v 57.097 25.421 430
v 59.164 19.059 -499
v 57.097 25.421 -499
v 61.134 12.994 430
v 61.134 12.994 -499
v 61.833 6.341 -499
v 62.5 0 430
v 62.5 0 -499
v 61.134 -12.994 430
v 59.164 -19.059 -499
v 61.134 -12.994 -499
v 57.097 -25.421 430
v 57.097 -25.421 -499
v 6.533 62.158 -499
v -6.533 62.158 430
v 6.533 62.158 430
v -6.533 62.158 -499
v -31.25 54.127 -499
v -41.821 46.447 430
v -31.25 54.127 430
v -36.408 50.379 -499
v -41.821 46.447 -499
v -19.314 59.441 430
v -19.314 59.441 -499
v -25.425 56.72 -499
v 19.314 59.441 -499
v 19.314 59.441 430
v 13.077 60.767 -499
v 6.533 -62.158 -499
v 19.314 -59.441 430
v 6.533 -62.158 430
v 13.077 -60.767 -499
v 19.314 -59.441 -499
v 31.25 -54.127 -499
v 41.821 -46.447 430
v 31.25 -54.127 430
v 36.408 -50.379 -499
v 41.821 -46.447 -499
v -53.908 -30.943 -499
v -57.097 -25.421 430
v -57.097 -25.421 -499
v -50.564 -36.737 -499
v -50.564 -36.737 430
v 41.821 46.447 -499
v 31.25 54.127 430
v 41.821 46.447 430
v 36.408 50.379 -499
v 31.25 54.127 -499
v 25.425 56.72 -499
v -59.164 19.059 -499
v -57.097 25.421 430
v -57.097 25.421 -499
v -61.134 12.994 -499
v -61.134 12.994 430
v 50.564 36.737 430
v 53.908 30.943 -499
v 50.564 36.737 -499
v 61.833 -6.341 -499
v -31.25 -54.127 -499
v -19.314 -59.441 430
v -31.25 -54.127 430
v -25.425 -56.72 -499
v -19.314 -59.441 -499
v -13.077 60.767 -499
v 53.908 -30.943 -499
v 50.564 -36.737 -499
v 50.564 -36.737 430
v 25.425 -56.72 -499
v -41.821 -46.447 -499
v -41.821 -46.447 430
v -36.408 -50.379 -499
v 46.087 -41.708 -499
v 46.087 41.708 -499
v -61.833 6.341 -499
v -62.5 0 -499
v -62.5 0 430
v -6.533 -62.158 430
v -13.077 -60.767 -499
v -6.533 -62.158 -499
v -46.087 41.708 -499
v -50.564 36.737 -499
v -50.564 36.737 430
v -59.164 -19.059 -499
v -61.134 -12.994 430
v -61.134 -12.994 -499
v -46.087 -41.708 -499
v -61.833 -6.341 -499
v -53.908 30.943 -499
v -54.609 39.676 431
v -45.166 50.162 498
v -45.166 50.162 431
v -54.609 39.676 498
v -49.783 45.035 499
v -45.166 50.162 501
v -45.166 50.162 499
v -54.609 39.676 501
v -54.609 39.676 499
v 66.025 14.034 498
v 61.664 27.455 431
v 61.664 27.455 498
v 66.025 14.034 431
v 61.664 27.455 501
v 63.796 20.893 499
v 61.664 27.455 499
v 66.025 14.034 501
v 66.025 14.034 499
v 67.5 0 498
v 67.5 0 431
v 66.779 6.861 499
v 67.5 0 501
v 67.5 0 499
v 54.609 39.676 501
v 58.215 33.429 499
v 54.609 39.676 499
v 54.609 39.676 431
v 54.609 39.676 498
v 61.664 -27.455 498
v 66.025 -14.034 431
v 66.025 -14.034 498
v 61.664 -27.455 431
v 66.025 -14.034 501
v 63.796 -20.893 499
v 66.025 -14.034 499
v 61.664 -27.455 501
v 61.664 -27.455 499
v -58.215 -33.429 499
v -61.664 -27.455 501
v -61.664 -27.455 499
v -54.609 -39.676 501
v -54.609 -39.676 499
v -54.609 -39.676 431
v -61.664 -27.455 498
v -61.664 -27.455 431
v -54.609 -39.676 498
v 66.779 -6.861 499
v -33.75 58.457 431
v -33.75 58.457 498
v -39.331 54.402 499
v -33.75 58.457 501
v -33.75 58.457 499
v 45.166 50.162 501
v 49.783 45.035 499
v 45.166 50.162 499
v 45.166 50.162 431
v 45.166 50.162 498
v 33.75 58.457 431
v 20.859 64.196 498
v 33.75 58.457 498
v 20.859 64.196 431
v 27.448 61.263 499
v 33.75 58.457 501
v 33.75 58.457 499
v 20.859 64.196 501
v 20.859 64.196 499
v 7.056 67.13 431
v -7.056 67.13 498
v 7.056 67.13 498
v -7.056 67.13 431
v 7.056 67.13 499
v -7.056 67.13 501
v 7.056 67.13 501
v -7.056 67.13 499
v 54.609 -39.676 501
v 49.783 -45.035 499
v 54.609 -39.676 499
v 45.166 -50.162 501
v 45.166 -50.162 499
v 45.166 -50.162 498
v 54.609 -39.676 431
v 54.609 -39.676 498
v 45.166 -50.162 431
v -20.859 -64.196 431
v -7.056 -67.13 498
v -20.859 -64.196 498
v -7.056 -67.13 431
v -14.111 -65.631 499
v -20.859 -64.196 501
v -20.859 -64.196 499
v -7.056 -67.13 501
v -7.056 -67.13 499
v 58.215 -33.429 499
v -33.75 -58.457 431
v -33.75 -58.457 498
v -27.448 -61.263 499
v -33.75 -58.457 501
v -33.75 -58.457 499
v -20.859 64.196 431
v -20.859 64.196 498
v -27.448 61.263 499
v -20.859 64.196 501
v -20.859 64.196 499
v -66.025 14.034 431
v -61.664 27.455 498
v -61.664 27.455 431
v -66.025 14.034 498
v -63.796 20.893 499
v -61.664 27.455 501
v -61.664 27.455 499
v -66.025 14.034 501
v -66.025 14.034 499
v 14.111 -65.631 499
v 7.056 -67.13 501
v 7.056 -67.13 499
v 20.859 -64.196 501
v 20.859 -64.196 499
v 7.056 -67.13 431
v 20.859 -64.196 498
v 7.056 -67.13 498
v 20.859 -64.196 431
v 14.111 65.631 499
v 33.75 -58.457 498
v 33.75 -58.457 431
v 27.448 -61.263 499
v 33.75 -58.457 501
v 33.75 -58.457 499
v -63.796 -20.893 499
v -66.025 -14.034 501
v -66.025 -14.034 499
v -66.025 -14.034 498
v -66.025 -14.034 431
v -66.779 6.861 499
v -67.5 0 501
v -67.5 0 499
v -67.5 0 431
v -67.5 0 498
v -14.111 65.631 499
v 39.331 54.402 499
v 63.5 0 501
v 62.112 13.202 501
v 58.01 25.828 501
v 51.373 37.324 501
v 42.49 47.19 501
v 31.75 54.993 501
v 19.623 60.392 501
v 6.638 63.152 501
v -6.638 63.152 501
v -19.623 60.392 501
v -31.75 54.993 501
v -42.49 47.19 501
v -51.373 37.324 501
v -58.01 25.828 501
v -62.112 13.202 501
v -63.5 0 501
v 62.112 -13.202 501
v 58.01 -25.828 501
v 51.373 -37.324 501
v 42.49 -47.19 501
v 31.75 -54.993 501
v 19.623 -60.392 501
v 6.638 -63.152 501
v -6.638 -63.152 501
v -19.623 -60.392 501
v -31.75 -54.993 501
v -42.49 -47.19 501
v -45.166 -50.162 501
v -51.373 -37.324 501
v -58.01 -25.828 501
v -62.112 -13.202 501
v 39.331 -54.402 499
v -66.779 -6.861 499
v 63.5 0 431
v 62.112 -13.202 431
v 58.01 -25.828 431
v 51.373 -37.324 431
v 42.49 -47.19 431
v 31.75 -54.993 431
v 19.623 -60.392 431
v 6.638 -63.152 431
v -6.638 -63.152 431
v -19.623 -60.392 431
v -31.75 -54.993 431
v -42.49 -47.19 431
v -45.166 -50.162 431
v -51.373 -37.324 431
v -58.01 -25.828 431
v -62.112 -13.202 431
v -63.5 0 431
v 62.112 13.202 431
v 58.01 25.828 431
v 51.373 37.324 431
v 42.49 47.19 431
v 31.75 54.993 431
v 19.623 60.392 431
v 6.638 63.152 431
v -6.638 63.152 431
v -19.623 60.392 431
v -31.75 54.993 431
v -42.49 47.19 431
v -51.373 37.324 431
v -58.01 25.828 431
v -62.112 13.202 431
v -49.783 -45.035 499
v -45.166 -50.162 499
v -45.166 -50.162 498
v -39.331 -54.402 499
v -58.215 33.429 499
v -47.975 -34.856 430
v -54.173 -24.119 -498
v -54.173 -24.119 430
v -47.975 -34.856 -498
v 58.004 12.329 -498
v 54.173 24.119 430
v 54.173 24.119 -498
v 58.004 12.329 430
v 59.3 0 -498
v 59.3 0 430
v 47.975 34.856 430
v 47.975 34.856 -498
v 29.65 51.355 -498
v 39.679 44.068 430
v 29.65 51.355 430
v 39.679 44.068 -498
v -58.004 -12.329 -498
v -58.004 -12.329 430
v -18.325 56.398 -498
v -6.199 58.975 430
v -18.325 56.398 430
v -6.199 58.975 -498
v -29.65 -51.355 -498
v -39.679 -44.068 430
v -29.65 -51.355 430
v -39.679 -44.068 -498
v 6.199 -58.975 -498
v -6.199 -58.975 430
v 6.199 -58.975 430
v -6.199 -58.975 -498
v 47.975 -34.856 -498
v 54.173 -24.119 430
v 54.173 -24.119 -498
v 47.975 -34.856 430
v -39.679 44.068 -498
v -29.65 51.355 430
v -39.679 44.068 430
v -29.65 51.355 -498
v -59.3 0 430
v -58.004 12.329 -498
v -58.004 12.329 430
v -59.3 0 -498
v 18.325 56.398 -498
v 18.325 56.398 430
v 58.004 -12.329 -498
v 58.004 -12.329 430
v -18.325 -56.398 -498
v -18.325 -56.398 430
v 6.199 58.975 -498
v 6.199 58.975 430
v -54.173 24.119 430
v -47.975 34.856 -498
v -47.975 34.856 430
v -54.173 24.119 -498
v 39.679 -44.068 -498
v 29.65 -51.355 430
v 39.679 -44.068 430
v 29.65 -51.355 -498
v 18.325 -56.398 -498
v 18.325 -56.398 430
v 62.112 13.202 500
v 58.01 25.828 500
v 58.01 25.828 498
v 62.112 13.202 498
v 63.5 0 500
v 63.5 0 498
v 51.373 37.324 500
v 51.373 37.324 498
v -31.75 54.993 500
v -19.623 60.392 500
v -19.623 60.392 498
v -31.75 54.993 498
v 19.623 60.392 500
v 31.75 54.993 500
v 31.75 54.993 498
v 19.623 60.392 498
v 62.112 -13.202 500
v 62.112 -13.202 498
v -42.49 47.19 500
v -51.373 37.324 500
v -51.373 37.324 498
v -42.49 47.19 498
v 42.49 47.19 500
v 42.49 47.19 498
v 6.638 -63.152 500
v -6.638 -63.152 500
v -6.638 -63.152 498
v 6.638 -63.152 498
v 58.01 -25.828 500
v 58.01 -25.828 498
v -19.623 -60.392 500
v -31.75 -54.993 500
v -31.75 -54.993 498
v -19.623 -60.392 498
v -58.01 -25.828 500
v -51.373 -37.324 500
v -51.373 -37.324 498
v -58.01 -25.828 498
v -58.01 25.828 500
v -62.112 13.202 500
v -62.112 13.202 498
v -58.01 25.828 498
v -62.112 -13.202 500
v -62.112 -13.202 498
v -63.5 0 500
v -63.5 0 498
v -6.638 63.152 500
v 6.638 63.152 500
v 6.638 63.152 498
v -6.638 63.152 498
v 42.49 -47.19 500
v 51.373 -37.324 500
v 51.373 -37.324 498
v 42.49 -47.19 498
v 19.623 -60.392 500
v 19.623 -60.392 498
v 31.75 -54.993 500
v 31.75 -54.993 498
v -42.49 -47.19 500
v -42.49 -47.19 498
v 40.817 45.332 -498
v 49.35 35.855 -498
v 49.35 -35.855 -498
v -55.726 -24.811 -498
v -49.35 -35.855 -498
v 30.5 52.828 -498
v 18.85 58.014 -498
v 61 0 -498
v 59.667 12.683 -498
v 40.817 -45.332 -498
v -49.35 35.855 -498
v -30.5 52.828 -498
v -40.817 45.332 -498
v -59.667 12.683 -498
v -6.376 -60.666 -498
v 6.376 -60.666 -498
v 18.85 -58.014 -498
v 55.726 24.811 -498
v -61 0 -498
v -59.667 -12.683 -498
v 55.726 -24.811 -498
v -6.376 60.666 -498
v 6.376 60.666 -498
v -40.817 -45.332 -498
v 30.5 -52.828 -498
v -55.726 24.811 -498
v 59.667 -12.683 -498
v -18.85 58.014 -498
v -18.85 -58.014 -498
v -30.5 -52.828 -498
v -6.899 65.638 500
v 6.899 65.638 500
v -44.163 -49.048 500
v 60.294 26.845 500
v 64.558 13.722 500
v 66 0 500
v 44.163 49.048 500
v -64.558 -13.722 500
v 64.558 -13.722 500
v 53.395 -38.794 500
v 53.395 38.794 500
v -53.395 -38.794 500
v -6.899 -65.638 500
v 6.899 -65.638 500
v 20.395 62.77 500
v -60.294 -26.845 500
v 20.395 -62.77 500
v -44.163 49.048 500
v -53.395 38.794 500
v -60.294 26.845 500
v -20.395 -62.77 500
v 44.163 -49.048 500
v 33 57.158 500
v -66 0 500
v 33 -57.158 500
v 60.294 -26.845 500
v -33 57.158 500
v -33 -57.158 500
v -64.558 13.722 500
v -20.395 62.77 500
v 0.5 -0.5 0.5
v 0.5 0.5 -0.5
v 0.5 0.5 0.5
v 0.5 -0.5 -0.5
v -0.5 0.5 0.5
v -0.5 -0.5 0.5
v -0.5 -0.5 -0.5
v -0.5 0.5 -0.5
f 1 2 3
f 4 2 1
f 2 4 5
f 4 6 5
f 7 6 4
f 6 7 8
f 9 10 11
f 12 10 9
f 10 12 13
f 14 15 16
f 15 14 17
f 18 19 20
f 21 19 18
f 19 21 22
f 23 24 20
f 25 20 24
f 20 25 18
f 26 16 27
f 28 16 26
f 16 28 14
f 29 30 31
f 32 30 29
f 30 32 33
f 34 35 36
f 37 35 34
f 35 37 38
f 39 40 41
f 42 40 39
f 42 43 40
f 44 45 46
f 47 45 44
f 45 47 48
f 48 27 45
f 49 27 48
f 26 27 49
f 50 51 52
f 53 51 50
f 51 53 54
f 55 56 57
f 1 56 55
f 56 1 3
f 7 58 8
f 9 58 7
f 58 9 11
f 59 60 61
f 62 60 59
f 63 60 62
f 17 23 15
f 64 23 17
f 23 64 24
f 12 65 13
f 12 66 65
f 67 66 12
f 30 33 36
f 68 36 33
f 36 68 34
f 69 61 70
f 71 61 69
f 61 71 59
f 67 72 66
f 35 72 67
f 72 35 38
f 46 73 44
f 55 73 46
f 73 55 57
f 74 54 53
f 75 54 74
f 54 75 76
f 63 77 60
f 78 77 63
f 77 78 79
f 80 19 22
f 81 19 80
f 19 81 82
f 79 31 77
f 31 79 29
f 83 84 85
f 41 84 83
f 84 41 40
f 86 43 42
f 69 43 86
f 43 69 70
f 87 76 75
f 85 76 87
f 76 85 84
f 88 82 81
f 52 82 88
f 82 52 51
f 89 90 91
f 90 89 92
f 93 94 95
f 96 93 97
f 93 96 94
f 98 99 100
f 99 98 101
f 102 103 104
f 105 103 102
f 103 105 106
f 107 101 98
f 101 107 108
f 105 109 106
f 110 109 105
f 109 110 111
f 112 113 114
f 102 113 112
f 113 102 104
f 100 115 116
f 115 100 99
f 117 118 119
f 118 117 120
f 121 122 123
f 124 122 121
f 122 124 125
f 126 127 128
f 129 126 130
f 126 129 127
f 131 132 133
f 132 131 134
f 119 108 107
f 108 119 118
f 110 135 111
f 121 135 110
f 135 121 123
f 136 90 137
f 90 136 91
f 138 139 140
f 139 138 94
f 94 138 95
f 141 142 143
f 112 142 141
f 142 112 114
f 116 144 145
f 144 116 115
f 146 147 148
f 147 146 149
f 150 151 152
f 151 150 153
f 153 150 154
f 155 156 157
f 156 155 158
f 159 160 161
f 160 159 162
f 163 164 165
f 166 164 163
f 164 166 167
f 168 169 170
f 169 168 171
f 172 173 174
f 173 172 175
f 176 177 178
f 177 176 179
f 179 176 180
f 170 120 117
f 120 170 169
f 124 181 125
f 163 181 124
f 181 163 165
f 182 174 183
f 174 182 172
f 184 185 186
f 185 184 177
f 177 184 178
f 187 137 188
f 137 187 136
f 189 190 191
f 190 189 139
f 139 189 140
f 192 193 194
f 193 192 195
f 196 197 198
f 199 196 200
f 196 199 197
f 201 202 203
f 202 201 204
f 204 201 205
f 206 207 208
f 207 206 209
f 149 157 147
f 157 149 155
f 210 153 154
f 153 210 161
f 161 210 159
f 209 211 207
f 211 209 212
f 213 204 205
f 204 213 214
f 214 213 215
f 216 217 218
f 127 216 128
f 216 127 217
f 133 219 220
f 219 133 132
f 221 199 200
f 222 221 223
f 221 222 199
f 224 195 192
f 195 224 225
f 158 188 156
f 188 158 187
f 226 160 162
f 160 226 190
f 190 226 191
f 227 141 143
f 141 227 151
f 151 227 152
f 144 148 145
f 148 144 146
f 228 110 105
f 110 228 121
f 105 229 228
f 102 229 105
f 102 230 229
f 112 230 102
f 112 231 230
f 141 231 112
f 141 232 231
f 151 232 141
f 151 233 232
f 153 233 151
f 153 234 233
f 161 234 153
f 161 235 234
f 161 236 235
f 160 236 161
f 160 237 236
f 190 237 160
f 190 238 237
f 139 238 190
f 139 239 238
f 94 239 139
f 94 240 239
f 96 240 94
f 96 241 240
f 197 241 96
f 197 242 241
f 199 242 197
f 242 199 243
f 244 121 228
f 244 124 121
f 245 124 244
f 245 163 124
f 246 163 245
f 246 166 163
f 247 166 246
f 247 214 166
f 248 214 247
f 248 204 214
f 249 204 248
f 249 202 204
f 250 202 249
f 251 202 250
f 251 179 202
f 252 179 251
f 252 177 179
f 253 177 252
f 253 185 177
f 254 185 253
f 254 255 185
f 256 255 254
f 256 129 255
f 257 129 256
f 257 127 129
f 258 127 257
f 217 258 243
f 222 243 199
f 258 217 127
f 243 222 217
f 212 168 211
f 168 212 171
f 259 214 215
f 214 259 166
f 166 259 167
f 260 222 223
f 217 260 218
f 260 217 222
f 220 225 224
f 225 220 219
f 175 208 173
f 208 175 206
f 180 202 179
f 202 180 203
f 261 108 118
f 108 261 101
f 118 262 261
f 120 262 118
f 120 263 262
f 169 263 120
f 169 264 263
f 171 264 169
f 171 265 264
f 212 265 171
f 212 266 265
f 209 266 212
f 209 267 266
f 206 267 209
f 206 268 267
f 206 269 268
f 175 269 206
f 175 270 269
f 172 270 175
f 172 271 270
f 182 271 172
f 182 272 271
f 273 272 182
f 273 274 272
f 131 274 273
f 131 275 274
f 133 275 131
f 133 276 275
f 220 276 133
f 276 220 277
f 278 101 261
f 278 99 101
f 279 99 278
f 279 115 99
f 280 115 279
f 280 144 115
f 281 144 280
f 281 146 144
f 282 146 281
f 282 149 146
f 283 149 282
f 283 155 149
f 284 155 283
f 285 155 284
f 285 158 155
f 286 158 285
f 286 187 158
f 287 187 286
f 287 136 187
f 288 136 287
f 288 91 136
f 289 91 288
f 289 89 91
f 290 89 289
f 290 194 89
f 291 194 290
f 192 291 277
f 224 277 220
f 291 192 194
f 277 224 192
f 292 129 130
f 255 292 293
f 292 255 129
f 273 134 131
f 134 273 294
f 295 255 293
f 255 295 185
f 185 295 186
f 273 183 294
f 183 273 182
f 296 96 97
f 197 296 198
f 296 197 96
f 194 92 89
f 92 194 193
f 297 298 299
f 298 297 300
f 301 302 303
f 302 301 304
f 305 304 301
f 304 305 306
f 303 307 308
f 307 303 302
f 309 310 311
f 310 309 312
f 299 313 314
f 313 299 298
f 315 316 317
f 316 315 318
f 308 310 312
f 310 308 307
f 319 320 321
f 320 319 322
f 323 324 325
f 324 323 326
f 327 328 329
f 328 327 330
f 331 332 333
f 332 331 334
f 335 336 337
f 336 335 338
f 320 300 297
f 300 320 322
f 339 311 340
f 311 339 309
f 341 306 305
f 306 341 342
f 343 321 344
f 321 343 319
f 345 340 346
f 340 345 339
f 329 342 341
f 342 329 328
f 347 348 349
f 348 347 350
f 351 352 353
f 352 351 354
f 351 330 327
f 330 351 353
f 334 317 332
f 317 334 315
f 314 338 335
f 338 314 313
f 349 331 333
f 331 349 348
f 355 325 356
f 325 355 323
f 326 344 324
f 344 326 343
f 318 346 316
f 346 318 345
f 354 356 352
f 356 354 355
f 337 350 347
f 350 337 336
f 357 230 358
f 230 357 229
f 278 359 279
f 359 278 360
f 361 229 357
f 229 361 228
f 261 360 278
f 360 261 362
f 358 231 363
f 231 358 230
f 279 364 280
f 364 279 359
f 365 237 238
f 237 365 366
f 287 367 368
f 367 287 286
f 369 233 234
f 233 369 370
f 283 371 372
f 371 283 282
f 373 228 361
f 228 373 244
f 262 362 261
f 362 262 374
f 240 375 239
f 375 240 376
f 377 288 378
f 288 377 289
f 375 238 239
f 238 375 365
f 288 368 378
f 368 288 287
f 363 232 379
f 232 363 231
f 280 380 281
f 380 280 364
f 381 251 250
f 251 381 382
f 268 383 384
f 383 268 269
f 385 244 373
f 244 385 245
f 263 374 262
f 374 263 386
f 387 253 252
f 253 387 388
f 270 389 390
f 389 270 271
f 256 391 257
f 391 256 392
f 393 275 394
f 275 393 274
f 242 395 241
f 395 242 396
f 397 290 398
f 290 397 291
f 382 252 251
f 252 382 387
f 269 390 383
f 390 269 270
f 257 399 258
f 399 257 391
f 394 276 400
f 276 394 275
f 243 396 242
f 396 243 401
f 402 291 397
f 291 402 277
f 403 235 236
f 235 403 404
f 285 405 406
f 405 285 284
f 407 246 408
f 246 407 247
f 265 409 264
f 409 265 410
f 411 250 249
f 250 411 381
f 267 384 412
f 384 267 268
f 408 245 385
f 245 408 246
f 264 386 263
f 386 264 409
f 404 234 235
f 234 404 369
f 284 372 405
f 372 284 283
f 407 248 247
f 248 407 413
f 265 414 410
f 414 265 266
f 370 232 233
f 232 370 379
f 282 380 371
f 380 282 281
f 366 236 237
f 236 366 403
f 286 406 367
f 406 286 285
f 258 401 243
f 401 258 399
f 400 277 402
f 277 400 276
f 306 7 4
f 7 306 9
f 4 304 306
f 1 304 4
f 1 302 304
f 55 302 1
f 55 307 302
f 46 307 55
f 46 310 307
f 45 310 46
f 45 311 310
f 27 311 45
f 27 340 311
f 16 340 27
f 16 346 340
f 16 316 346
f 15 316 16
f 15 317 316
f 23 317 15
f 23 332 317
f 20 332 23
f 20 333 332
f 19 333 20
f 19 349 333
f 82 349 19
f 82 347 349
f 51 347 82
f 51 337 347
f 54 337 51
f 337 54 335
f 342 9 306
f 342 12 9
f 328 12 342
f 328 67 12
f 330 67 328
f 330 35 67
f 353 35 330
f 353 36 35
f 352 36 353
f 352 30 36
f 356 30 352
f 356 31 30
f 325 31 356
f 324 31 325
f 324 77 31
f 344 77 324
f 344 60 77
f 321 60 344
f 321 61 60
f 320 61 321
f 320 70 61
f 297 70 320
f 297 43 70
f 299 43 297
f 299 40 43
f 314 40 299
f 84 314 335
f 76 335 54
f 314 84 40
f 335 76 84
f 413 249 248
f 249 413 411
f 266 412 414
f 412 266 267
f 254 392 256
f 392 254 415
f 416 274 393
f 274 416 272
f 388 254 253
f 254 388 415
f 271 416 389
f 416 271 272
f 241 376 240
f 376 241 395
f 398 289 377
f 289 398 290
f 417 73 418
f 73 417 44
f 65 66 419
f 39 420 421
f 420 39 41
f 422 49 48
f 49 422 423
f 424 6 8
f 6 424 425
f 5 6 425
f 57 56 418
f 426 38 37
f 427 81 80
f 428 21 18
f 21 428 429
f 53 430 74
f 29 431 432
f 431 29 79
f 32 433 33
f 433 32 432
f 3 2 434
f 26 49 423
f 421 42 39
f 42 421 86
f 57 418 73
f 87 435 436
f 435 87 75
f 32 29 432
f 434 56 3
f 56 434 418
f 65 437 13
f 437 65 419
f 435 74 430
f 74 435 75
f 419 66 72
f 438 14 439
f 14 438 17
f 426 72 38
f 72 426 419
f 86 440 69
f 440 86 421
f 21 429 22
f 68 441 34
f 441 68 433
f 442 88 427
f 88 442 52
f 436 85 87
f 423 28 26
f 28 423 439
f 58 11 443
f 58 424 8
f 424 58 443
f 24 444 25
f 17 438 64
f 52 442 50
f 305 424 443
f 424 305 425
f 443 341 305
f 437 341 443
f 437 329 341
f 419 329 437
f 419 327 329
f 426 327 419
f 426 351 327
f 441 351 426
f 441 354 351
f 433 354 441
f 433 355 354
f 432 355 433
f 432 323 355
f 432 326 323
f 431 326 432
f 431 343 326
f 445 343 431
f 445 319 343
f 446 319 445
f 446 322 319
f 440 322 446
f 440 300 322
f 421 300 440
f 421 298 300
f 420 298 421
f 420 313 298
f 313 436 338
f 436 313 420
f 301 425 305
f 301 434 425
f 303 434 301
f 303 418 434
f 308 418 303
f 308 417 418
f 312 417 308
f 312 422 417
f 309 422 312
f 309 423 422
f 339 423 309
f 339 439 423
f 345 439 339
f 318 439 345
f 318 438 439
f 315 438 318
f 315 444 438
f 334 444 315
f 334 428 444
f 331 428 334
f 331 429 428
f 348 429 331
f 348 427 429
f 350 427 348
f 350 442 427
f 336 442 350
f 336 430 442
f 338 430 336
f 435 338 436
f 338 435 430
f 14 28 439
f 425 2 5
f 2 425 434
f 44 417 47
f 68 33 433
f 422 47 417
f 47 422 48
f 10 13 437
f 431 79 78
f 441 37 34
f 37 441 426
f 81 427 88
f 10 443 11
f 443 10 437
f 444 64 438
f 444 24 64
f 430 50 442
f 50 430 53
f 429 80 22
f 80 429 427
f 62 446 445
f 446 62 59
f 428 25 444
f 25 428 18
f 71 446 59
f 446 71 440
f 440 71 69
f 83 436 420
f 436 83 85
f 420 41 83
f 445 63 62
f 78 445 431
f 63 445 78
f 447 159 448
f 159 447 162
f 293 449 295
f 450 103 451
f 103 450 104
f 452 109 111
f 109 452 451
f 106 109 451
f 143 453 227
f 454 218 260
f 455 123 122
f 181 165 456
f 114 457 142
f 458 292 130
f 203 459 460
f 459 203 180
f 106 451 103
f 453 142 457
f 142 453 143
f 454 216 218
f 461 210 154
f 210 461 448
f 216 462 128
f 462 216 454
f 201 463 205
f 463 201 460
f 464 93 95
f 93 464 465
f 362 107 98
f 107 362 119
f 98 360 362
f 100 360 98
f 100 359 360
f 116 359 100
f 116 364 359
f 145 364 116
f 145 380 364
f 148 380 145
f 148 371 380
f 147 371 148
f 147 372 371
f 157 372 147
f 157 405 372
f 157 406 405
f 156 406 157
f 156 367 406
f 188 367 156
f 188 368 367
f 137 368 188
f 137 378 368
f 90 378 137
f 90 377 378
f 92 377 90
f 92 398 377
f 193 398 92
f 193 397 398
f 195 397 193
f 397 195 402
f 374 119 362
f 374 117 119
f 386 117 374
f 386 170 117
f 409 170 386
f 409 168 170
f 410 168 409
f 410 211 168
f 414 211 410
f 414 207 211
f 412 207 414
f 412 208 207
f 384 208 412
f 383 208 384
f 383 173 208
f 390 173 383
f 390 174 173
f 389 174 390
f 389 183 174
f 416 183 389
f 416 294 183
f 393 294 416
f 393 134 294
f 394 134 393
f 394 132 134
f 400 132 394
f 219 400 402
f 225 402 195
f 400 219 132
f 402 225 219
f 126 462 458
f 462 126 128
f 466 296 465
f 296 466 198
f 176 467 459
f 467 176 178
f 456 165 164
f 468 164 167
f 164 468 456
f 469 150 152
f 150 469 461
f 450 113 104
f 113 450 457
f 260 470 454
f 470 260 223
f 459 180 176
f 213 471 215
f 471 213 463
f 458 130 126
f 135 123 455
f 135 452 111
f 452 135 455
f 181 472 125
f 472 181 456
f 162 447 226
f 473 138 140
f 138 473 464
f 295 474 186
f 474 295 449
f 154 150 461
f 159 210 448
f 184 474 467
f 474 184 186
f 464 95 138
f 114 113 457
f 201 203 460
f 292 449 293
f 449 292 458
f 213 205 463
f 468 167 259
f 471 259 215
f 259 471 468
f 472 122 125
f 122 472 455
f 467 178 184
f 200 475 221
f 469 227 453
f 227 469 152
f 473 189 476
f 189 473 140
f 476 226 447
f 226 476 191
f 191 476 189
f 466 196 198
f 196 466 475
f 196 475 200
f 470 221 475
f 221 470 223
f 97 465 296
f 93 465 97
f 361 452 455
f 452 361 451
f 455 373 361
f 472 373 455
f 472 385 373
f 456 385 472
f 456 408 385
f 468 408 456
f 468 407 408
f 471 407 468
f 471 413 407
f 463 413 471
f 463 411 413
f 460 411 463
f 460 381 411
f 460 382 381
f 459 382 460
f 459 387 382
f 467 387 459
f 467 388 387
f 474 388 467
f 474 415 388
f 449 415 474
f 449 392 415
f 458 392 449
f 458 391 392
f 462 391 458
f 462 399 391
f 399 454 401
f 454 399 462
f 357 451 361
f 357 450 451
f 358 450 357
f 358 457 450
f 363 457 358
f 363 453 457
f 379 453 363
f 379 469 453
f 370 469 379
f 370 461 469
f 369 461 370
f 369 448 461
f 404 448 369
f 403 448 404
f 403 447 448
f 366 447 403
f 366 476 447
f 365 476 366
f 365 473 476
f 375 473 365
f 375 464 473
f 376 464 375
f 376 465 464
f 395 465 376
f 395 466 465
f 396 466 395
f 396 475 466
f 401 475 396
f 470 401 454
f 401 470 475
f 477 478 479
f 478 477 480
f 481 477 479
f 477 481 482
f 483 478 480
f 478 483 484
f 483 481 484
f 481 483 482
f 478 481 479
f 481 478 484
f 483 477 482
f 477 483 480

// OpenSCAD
// Parameters
pipe_length = 1000; //[500:2000:1]
outer_diameter = 125; //[62.5:250:0.5]
wall_thickness = 3.2; //[1.6:6.4:0.1]
socket_length = 70; //[35:140:1]
socket_outer_diameter = 135; //[125:160:0.5]
socket_wall_thickness = 4; //[2:8:0.1]
chamfer_length = 2; //[1:6:0.1]
chamfer_radial = 1.5; //[0.5:4:0.1]
overlap = 1; //[0.5:2:0.1]

// Base Shapes
module pipe_body() {
  cylinder(h=pipe_length, r=outer_diameter/2, center=true);
}

module inner_bore() {
  cylinder(h=pipe_length + 2*overlap, r=outer_diameter/2 - wall_thickness, center=true);
}

module socket_end() {
  translate([0, 0, pipe_length/2 - socket_length/2 + overlap])
    cylinder(h=socket_length, r=socket_outer_diameter/2, center=true);
}

module socket_inner_bore() {
  translate([0, 0, pipe_length/2 - socket_length/2 + overlap])
    cylinder(h=socket_length + 2*overlap, r=socket_outer_diameter/2 - socket_wall_thickness, center=true);
}

module chamfer_cut_spigot() {
  translate([0, 0, -pipe_length/2 + chamfer_length/2])
    cylinder(h=chamfer_length, r1=outer_diameter/2 + chamfer_radial, r2=outer_diameter/2 - chamfer_radial, center=true);
}

module chamfer_cut_socket_outer() {
  translate([0, 0, pipe_length/2 - chamfer_length/2])
    cylinder(h=chamfer_length, r1=socket_outer_diameter/2 + chamfer_radial, r2=socket_outer_diameter/2 - chamfer_radial, center=true);
}

module markings_text() {
  // Placeholder for markings, represented as a small cube
  cube([overlap, overlap, overlap], center=true);
}

// Operations
module outer_with_socket() {
  union() {
    pipe_body();
    socket_end();
  }
}

module all_bores() {
  union() {
    inner_bore();
    socket_inner_bore();
  }
}

module chamfer_edges() {
  union() {
    chamfer_cut_spigot();
    chamfer_cut_socket_outer();
  }
}

module pipe_hollowed() {
  difference() {
    outer_with_socket();
    all_bores();
  }
}

module pipe_with_chamfers() {
  difference() {
    pipe_hollowed();
    chamfer_edges();
  }
}

// Final Model
module final_model() {
  union() {
    pipe_with_chamfers();
    markings_text();
  }
}

// Render the final model
color([0.85, 0.85, 0.8]) // Off-white color for the pipe
final_model();
